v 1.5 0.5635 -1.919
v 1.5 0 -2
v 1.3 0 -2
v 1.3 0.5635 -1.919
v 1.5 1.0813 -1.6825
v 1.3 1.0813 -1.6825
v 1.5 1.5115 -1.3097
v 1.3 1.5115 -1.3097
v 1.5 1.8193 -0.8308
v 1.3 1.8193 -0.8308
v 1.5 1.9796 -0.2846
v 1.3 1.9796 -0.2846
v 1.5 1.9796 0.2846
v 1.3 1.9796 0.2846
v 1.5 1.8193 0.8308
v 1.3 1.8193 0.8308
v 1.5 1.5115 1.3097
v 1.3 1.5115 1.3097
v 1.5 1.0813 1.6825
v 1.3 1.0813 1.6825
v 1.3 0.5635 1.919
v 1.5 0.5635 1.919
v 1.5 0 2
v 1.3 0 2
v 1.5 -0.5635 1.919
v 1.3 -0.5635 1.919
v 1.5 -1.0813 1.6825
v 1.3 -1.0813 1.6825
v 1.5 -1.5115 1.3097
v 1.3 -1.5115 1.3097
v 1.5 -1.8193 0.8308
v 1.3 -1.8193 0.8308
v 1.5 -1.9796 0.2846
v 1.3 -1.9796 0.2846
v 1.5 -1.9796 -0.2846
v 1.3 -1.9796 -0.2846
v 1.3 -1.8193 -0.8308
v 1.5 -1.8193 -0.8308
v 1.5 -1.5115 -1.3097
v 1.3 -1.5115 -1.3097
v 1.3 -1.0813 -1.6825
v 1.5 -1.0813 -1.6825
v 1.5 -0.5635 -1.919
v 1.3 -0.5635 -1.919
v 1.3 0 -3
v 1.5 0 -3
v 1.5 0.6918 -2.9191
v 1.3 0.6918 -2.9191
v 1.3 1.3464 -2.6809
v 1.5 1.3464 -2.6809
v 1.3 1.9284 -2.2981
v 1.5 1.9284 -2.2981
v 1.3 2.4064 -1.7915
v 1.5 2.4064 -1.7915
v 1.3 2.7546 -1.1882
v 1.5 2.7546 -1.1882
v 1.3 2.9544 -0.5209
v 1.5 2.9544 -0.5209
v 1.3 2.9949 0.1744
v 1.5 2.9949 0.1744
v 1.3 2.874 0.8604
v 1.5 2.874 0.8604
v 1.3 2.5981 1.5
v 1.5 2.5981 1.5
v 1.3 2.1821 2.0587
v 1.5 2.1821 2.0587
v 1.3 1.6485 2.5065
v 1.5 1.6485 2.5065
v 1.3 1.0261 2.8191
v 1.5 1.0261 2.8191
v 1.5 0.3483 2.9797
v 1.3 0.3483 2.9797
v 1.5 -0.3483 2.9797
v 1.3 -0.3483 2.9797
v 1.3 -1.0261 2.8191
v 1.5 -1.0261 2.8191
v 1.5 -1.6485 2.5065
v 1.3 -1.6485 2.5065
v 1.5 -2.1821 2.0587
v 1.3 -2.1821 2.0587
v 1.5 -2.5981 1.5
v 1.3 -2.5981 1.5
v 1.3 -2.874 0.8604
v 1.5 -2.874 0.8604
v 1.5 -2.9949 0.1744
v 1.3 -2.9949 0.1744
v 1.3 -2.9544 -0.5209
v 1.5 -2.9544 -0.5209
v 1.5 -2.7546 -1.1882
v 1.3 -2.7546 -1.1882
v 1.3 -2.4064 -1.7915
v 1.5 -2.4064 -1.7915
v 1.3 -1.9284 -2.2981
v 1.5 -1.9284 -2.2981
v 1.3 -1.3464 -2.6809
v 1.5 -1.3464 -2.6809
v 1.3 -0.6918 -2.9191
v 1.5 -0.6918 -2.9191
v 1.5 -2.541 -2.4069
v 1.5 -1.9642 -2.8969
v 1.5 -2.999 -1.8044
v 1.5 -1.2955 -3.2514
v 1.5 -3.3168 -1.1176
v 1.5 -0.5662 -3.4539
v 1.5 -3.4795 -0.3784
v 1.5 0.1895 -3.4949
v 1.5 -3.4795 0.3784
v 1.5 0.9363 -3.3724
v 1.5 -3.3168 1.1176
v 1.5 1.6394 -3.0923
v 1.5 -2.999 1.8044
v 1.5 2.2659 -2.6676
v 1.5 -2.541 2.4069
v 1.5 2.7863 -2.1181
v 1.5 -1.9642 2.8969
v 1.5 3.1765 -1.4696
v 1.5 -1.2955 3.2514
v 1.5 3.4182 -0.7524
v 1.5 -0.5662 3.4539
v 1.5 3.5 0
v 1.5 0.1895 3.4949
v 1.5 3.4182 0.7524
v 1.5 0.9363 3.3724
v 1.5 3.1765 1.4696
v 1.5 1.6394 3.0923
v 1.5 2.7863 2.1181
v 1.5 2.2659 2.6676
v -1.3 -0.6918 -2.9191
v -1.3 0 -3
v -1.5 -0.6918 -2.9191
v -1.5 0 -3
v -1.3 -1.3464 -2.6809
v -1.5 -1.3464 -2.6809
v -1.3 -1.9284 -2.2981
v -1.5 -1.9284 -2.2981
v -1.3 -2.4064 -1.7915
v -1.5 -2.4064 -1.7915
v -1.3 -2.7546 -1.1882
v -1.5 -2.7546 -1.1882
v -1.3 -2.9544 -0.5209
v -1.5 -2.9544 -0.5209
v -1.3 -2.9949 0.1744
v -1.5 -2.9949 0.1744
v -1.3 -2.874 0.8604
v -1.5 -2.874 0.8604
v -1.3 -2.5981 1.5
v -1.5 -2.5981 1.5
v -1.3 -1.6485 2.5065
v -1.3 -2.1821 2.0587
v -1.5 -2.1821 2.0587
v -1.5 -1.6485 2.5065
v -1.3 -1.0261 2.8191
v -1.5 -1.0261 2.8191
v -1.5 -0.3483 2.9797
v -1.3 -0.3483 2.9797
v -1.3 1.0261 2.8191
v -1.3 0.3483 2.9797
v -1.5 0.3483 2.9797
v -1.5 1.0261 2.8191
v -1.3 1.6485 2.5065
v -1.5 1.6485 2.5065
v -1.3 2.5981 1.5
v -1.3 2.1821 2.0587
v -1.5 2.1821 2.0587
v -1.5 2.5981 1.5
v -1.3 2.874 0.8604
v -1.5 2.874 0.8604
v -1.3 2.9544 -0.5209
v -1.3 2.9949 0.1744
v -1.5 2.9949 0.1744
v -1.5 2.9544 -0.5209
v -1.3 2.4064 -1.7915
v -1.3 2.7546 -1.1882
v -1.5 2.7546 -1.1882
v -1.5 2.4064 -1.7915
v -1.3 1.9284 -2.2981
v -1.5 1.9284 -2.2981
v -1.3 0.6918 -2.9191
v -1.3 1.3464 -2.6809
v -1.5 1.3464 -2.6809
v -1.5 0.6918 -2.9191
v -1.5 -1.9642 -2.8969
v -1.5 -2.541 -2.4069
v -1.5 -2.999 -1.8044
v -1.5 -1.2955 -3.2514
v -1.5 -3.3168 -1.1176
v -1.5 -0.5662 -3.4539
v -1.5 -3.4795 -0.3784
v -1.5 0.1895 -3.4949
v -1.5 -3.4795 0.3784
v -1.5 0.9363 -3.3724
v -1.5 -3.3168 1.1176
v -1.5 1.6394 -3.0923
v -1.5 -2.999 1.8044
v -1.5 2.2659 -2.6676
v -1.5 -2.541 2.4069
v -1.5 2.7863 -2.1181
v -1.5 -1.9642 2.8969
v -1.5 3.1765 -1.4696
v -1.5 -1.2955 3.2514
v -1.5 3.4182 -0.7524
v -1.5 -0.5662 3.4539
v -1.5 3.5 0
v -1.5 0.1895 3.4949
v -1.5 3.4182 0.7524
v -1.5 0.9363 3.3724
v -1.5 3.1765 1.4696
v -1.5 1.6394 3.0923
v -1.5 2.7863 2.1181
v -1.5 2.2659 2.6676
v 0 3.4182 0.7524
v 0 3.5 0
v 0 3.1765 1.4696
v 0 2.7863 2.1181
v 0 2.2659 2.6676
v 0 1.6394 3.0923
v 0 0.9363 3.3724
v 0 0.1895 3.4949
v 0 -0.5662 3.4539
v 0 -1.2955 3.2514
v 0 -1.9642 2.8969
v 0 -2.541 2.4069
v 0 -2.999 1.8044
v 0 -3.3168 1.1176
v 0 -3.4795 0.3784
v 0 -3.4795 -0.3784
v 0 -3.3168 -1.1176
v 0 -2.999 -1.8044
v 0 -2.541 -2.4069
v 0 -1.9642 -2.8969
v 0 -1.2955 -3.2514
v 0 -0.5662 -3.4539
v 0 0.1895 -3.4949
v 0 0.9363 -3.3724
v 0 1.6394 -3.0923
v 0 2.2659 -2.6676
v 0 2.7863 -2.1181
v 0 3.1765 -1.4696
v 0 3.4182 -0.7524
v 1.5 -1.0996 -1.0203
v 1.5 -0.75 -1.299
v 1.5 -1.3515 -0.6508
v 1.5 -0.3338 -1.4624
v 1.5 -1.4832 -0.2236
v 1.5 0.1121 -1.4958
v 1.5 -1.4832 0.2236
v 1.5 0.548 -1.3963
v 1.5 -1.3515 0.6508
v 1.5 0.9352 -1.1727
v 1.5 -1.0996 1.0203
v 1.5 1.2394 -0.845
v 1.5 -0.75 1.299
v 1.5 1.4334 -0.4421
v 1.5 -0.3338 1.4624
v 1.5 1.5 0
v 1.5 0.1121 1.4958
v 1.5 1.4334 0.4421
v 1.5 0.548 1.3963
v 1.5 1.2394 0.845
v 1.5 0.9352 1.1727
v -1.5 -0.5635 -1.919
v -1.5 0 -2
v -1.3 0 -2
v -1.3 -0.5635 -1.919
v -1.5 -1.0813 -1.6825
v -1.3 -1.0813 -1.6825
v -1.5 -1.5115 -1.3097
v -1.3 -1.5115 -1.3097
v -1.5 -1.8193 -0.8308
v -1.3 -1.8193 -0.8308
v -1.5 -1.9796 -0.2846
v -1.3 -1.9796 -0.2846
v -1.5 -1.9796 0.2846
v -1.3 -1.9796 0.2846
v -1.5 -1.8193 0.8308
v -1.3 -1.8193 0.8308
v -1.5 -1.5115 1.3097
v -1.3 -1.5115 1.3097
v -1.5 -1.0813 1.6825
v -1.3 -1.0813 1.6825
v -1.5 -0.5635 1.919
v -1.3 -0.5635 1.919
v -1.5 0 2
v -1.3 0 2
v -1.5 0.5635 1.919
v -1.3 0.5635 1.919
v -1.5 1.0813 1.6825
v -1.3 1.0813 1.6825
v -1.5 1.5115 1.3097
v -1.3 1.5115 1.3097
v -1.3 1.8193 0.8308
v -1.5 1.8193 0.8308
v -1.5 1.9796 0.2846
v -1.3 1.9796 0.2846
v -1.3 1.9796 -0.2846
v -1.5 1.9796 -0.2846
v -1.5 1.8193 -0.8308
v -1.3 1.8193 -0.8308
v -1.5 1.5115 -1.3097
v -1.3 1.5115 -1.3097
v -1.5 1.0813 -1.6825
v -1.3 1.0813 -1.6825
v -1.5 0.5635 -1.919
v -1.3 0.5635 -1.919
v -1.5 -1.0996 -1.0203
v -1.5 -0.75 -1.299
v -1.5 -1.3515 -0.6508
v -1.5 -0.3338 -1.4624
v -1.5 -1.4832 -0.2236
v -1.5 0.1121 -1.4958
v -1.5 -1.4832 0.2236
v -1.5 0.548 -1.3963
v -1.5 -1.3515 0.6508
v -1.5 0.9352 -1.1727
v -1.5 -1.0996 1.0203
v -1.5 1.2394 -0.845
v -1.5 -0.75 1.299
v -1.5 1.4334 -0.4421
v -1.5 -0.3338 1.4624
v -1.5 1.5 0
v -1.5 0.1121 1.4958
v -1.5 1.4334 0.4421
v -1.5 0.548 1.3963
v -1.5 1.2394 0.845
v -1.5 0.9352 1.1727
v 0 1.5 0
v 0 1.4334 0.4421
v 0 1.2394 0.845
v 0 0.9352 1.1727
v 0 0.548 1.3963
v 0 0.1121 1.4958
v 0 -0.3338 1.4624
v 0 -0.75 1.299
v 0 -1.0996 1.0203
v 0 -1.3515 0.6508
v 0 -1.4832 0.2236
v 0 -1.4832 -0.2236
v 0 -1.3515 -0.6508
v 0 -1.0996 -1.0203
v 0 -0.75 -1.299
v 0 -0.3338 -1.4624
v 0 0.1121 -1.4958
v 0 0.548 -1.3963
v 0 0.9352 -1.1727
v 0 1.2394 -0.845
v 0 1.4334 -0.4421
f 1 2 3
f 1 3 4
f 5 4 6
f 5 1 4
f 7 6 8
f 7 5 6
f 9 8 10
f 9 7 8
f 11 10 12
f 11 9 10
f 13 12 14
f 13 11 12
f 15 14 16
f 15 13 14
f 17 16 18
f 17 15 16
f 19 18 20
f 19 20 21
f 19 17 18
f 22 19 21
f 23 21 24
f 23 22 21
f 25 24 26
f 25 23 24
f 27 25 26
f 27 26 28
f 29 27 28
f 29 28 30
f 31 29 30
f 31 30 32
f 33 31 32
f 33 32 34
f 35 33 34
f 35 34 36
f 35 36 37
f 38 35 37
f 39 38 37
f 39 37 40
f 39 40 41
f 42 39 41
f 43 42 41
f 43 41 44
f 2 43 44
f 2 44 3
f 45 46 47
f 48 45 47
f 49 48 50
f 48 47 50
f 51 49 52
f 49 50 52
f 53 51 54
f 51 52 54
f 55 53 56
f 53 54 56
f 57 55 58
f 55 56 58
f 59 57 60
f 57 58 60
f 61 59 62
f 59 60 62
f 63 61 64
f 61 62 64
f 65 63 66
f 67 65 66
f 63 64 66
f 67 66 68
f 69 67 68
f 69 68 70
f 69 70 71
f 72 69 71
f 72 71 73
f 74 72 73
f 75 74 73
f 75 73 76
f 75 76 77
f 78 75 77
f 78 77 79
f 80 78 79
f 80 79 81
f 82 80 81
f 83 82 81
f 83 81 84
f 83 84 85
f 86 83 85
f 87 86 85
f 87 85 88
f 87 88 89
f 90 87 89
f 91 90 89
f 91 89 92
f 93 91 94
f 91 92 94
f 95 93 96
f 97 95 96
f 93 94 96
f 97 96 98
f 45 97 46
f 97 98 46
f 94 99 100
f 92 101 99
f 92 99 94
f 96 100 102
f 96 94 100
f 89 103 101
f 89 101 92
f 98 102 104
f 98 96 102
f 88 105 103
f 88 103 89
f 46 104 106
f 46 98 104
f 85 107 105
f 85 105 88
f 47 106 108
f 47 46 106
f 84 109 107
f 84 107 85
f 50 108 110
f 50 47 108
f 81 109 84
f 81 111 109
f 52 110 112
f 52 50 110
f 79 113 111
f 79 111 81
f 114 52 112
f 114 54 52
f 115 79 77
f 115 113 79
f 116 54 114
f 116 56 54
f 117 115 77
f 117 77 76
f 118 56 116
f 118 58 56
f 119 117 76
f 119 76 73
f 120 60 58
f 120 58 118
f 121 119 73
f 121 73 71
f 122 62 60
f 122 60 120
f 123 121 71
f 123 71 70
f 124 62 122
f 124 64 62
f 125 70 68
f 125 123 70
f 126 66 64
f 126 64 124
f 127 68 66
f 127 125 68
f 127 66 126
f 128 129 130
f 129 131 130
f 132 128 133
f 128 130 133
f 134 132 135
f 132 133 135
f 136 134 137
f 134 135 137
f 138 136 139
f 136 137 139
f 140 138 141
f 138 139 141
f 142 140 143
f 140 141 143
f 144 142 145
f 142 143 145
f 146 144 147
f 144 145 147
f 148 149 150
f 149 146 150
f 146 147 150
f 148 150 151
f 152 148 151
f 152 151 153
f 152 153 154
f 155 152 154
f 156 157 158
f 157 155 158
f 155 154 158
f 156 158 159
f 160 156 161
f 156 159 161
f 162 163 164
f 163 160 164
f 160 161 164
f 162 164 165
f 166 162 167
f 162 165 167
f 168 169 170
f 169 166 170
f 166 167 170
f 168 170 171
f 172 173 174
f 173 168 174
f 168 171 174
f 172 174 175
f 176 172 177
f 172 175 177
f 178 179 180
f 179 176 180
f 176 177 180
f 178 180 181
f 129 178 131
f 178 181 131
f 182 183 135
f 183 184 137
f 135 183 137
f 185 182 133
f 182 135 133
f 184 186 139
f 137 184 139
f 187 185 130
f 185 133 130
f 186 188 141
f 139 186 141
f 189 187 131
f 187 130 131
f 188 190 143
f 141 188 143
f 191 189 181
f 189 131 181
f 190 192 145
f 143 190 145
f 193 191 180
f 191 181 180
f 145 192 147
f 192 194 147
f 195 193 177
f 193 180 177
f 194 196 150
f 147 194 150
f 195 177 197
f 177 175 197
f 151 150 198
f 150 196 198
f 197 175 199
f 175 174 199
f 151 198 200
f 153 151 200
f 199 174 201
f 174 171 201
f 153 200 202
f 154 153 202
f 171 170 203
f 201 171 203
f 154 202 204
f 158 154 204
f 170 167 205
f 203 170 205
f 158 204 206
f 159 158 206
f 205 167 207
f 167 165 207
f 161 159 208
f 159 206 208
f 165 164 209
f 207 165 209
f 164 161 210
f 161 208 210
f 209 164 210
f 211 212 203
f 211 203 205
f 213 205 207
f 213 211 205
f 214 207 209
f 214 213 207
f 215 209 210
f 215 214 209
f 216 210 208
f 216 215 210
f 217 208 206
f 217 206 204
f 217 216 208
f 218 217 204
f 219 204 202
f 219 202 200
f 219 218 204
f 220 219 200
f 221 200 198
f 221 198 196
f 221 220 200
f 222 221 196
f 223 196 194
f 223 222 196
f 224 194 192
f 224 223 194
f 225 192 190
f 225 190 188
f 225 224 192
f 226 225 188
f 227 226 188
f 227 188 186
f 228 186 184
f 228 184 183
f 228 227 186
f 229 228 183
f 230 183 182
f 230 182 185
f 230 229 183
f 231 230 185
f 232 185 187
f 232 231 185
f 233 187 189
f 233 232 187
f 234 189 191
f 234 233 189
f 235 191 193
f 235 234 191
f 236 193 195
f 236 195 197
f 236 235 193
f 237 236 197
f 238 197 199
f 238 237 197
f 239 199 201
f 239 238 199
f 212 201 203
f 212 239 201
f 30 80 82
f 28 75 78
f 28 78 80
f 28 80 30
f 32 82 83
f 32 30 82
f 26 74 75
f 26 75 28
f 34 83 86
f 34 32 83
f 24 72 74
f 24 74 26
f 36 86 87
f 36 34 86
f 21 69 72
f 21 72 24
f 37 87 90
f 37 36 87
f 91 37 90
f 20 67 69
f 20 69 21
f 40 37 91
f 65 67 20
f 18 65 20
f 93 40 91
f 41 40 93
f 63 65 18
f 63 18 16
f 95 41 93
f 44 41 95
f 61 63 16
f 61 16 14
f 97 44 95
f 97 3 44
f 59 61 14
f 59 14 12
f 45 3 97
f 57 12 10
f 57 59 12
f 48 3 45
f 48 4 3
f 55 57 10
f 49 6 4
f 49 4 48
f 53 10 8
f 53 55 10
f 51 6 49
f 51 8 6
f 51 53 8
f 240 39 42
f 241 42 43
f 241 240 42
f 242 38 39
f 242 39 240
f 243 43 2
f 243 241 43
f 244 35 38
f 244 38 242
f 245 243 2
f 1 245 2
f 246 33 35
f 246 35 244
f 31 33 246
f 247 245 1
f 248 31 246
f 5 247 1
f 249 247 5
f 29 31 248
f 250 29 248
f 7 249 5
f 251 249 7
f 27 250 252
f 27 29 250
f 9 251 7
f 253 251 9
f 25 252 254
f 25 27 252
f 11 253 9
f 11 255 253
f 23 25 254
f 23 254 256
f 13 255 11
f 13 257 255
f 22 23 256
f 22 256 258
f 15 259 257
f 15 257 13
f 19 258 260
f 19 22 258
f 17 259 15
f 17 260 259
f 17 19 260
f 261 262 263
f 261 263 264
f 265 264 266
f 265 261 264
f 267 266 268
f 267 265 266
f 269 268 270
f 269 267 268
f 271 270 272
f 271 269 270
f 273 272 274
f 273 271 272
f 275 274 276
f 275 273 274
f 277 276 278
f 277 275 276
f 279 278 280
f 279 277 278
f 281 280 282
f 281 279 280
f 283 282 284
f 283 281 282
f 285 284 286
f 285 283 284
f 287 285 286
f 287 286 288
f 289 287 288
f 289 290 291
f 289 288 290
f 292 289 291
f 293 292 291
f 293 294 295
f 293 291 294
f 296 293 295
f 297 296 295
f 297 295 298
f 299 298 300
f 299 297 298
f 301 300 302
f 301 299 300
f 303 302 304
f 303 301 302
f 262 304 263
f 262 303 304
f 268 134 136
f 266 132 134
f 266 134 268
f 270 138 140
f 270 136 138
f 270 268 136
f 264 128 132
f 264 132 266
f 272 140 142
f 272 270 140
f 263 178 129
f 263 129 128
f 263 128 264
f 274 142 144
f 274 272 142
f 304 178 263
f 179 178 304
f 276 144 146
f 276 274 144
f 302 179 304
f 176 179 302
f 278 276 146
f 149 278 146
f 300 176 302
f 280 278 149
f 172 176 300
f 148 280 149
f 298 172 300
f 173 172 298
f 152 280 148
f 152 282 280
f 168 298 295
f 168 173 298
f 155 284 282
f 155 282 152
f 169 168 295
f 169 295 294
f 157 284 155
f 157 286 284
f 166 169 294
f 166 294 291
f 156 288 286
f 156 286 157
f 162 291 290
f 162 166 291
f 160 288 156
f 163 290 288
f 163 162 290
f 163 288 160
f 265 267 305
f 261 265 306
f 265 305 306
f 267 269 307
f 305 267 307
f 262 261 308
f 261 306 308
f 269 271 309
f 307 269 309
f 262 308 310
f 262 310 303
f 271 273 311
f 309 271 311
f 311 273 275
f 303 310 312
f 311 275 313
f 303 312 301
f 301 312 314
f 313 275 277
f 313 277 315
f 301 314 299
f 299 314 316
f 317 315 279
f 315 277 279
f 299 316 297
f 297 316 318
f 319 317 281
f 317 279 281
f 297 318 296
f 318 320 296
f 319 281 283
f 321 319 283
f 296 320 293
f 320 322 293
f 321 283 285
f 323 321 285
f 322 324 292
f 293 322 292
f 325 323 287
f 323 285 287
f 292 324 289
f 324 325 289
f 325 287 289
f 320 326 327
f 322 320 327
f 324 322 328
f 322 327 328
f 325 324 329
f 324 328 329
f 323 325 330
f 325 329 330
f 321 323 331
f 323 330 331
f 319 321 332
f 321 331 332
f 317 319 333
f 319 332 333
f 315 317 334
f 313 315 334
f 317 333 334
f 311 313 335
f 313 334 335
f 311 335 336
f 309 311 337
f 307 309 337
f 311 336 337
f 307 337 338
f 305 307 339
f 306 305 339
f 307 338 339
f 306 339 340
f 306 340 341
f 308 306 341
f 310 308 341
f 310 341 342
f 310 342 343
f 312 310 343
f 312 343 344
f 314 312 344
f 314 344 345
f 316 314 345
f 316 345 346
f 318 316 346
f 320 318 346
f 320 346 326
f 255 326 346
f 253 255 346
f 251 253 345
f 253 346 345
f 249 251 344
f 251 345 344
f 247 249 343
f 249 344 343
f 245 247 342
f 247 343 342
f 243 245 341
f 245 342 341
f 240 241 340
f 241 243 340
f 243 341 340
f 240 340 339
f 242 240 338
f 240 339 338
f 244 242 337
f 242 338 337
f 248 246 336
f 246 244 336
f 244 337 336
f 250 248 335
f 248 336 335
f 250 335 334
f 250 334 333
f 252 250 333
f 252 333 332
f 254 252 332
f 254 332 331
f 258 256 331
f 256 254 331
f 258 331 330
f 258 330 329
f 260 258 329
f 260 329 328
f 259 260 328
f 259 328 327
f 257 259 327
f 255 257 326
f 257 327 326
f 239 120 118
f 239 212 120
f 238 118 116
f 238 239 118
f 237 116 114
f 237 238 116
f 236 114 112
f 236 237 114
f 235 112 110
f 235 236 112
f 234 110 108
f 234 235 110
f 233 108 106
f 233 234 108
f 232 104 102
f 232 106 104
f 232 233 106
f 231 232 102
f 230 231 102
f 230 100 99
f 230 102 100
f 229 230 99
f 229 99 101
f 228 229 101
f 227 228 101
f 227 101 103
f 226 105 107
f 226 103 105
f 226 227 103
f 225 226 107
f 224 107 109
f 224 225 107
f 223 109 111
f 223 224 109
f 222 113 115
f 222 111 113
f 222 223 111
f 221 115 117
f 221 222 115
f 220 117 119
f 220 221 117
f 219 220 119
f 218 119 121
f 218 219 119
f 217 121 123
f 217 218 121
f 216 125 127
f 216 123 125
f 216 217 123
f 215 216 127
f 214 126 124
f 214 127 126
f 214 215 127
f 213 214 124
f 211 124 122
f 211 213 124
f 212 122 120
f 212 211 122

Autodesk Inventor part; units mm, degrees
ref_plane "YZ Plane" through (0, 0, 0) normal (1, 0, 0) x (0, 1, 0)
ref_plane "XZ Plane" through (0, 0, 0) normal (0, 1, 0) x (-1, 0, 0)
ref_plane "XY Plane" through (0, 0, 0) normal (0, 0, 1) x (1, 0, 0)
sketch "Sketch1" plane through (0, 0, 0) normal (1, 0, 0) x (0, 1, 0)
  circle A0 centre (0, 0) radius 1.5
  circle A1 centre (0, 0) radius 3.5
  dimension "d0" = 3
  dimension "d1" = 7
extrude "Extrusion1" add sketch "Sketch1" along normal mid plane 3
sketch "Sketch2" plane through (1.5, 0, 0) normal (1, 0, 0) x (0, 0, -1)
  circle A0 centre (0, 0) radius 2
  circle A1 centre (0, 0) radius 3
  dimension "d4" = 4
  dimension "d5" = 6
extrude "Extrusion2" cut sketch "Sketch2" against normal blind 0.2
mirror "Mirror1" about plane through (0, 0, 0) normal (1, 0, 0) of "Extrusion2"
properties part number "WheelBearings"
